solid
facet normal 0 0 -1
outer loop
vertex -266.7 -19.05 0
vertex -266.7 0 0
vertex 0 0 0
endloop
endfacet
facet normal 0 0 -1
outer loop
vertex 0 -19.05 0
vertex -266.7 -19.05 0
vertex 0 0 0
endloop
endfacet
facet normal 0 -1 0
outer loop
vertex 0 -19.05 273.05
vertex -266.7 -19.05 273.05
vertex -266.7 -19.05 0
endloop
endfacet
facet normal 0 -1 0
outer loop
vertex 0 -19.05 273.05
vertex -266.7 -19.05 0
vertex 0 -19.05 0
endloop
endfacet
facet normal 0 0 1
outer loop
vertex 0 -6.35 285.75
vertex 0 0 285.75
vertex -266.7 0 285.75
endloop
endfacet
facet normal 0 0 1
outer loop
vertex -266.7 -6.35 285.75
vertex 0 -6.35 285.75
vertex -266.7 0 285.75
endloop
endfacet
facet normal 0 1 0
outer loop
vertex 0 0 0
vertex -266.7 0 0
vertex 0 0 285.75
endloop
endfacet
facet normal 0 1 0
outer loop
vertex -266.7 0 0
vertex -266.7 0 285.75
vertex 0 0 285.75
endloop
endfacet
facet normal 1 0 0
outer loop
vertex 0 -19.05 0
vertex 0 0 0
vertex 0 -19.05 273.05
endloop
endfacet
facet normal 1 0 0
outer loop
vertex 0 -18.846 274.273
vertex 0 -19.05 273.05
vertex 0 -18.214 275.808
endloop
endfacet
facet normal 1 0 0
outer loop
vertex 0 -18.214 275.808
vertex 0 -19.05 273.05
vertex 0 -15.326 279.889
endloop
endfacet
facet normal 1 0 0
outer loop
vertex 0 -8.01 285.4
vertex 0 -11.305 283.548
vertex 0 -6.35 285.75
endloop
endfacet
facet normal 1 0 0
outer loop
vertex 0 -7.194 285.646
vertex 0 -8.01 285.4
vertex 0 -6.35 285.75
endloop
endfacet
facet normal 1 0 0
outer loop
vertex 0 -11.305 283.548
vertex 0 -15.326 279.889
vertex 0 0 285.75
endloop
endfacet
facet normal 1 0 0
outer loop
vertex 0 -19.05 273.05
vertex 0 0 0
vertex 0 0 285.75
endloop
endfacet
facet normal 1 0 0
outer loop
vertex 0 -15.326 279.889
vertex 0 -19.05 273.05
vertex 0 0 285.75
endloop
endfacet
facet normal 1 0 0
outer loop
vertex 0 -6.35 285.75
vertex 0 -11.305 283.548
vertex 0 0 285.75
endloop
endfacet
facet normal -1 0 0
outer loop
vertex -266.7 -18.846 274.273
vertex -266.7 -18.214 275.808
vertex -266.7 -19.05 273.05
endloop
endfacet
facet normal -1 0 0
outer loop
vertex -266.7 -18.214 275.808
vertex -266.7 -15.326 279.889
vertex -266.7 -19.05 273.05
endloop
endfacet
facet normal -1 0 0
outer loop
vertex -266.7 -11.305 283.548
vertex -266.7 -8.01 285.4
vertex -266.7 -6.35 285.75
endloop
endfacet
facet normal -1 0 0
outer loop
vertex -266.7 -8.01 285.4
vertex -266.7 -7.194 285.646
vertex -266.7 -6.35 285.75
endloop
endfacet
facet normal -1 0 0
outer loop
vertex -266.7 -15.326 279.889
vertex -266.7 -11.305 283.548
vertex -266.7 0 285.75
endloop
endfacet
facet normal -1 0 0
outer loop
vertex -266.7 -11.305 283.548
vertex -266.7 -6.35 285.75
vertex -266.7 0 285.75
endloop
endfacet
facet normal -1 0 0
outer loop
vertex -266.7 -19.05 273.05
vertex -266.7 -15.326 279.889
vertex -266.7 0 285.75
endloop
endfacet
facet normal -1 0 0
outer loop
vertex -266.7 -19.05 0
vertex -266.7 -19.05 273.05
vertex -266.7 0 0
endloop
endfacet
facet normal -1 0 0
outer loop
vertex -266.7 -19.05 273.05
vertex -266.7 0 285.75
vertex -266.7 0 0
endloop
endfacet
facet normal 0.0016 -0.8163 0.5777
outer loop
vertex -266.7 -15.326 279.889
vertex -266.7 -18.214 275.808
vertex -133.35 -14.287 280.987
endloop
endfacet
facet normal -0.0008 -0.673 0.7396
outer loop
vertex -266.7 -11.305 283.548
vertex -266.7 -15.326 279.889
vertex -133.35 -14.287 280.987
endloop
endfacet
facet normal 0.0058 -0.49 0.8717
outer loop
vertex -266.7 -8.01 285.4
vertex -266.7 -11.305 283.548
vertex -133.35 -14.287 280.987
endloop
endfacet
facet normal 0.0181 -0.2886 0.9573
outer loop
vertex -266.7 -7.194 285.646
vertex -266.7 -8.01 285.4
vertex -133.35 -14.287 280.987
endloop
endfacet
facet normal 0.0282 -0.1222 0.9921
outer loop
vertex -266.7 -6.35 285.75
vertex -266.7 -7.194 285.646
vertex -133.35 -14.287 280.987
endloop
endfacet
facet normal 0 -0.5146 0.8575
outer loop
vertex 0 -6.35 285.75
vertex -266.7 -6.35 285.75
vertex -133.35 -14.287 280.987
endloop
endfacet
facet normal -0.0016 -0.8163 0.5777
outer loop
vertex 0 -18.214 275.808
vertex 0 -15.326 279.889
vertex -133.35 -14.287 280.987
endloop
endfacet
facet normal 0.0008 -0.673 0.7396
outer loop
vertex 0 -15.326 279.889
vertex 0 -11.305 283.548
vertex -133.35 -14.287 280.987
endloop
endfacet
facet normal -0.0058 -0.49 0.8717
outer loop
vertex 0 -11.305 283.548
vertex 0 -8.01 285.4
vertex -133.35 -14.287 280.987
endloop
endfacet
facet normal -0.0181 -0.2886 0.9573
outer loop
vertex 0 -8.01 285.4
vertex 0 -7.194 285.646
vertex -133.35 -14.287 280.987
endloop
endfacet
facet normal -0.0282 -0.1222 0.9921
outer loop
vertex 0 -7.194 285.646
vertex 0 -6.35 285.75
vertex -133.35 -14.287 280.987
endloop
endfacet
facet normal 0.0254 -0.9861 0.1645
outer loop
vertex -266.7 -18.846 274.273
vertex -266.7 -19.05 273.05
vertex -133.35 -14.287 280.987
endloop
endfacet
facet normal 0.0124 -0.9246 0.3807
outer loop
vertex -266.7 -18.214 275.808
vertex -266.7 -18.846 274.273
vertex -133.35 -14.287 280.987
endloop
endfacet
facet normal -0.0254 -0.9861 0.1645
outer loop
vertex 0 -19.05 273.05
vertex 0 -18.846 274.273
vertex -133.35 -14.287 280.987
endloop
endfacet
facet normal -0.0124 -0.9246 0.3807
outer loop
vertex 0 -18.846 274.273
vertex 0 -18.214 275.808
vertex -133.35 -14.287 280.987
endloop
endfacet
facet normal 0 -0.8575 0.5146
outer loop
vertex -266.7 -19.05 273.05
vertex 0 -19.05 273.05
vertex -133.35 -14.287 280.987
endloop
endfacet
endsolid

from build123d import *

# Parameters (mm, degrees)
F0_W        = 12.7
F0_H        = 76.2
F0_H_2      = 57.15
F1_DEPTH    = 19.05
F2_T1_DEPTH = 330.2


# Not quite as in the source:
# - a fillet or chamfer that OpenCascade refuses, or shapes differently, is made with other operations: its cross-section is extruded or revolved along the edge and cut away or added


with BuildPart() as f1:
    # F0 (on Front) → F1 (new body)
    with BuildSketch(Plane.XZ):
        Polygon((-266.7, 0), (0, 0), (0, 209.55), (-254, 209.55), (-266.7, 209.55), align=None)
        with Locations((-260.35, 247.65)):
            Rectangle(F0_W, F0_H)
        with Locations((-6.35, 257.175)):
            Rectangle(F0_W, F0_H_2)
        Polygon((-254, 209.55), (0, 209.55), (0, 228.6), (-12.7, 228.6), (-12.7, 285.75), (-254, 285.75), align=None)
    extrude(amount=F1_DEPTH)

    # F2: fillet of radius 12.7 on 1 edges, made by hand

    # F2_s2 → F2_t1 (cut)
    with BuildSketch(Plane.YZ.offset(-298.45)):
        with BuildLine():
            add(Edge.make_bspline(
                [(-6.35, 285.75), (-19.05, 285.75), (-19.05, 273.05)],
                knots=[0, 0, 0, 1, 1, 1], degree=2, weights=[1, 0.3333333333, 1]))
            Line((-19.05, 273.05), (-19.05, 285.75))
            Line((-19.05, 285.75), (-6.35, 285.75))
        make_face()
    extrude(amount=F2_T1_DEPTH, mode=Mode.SUBTRACT)


solid = f1.part
